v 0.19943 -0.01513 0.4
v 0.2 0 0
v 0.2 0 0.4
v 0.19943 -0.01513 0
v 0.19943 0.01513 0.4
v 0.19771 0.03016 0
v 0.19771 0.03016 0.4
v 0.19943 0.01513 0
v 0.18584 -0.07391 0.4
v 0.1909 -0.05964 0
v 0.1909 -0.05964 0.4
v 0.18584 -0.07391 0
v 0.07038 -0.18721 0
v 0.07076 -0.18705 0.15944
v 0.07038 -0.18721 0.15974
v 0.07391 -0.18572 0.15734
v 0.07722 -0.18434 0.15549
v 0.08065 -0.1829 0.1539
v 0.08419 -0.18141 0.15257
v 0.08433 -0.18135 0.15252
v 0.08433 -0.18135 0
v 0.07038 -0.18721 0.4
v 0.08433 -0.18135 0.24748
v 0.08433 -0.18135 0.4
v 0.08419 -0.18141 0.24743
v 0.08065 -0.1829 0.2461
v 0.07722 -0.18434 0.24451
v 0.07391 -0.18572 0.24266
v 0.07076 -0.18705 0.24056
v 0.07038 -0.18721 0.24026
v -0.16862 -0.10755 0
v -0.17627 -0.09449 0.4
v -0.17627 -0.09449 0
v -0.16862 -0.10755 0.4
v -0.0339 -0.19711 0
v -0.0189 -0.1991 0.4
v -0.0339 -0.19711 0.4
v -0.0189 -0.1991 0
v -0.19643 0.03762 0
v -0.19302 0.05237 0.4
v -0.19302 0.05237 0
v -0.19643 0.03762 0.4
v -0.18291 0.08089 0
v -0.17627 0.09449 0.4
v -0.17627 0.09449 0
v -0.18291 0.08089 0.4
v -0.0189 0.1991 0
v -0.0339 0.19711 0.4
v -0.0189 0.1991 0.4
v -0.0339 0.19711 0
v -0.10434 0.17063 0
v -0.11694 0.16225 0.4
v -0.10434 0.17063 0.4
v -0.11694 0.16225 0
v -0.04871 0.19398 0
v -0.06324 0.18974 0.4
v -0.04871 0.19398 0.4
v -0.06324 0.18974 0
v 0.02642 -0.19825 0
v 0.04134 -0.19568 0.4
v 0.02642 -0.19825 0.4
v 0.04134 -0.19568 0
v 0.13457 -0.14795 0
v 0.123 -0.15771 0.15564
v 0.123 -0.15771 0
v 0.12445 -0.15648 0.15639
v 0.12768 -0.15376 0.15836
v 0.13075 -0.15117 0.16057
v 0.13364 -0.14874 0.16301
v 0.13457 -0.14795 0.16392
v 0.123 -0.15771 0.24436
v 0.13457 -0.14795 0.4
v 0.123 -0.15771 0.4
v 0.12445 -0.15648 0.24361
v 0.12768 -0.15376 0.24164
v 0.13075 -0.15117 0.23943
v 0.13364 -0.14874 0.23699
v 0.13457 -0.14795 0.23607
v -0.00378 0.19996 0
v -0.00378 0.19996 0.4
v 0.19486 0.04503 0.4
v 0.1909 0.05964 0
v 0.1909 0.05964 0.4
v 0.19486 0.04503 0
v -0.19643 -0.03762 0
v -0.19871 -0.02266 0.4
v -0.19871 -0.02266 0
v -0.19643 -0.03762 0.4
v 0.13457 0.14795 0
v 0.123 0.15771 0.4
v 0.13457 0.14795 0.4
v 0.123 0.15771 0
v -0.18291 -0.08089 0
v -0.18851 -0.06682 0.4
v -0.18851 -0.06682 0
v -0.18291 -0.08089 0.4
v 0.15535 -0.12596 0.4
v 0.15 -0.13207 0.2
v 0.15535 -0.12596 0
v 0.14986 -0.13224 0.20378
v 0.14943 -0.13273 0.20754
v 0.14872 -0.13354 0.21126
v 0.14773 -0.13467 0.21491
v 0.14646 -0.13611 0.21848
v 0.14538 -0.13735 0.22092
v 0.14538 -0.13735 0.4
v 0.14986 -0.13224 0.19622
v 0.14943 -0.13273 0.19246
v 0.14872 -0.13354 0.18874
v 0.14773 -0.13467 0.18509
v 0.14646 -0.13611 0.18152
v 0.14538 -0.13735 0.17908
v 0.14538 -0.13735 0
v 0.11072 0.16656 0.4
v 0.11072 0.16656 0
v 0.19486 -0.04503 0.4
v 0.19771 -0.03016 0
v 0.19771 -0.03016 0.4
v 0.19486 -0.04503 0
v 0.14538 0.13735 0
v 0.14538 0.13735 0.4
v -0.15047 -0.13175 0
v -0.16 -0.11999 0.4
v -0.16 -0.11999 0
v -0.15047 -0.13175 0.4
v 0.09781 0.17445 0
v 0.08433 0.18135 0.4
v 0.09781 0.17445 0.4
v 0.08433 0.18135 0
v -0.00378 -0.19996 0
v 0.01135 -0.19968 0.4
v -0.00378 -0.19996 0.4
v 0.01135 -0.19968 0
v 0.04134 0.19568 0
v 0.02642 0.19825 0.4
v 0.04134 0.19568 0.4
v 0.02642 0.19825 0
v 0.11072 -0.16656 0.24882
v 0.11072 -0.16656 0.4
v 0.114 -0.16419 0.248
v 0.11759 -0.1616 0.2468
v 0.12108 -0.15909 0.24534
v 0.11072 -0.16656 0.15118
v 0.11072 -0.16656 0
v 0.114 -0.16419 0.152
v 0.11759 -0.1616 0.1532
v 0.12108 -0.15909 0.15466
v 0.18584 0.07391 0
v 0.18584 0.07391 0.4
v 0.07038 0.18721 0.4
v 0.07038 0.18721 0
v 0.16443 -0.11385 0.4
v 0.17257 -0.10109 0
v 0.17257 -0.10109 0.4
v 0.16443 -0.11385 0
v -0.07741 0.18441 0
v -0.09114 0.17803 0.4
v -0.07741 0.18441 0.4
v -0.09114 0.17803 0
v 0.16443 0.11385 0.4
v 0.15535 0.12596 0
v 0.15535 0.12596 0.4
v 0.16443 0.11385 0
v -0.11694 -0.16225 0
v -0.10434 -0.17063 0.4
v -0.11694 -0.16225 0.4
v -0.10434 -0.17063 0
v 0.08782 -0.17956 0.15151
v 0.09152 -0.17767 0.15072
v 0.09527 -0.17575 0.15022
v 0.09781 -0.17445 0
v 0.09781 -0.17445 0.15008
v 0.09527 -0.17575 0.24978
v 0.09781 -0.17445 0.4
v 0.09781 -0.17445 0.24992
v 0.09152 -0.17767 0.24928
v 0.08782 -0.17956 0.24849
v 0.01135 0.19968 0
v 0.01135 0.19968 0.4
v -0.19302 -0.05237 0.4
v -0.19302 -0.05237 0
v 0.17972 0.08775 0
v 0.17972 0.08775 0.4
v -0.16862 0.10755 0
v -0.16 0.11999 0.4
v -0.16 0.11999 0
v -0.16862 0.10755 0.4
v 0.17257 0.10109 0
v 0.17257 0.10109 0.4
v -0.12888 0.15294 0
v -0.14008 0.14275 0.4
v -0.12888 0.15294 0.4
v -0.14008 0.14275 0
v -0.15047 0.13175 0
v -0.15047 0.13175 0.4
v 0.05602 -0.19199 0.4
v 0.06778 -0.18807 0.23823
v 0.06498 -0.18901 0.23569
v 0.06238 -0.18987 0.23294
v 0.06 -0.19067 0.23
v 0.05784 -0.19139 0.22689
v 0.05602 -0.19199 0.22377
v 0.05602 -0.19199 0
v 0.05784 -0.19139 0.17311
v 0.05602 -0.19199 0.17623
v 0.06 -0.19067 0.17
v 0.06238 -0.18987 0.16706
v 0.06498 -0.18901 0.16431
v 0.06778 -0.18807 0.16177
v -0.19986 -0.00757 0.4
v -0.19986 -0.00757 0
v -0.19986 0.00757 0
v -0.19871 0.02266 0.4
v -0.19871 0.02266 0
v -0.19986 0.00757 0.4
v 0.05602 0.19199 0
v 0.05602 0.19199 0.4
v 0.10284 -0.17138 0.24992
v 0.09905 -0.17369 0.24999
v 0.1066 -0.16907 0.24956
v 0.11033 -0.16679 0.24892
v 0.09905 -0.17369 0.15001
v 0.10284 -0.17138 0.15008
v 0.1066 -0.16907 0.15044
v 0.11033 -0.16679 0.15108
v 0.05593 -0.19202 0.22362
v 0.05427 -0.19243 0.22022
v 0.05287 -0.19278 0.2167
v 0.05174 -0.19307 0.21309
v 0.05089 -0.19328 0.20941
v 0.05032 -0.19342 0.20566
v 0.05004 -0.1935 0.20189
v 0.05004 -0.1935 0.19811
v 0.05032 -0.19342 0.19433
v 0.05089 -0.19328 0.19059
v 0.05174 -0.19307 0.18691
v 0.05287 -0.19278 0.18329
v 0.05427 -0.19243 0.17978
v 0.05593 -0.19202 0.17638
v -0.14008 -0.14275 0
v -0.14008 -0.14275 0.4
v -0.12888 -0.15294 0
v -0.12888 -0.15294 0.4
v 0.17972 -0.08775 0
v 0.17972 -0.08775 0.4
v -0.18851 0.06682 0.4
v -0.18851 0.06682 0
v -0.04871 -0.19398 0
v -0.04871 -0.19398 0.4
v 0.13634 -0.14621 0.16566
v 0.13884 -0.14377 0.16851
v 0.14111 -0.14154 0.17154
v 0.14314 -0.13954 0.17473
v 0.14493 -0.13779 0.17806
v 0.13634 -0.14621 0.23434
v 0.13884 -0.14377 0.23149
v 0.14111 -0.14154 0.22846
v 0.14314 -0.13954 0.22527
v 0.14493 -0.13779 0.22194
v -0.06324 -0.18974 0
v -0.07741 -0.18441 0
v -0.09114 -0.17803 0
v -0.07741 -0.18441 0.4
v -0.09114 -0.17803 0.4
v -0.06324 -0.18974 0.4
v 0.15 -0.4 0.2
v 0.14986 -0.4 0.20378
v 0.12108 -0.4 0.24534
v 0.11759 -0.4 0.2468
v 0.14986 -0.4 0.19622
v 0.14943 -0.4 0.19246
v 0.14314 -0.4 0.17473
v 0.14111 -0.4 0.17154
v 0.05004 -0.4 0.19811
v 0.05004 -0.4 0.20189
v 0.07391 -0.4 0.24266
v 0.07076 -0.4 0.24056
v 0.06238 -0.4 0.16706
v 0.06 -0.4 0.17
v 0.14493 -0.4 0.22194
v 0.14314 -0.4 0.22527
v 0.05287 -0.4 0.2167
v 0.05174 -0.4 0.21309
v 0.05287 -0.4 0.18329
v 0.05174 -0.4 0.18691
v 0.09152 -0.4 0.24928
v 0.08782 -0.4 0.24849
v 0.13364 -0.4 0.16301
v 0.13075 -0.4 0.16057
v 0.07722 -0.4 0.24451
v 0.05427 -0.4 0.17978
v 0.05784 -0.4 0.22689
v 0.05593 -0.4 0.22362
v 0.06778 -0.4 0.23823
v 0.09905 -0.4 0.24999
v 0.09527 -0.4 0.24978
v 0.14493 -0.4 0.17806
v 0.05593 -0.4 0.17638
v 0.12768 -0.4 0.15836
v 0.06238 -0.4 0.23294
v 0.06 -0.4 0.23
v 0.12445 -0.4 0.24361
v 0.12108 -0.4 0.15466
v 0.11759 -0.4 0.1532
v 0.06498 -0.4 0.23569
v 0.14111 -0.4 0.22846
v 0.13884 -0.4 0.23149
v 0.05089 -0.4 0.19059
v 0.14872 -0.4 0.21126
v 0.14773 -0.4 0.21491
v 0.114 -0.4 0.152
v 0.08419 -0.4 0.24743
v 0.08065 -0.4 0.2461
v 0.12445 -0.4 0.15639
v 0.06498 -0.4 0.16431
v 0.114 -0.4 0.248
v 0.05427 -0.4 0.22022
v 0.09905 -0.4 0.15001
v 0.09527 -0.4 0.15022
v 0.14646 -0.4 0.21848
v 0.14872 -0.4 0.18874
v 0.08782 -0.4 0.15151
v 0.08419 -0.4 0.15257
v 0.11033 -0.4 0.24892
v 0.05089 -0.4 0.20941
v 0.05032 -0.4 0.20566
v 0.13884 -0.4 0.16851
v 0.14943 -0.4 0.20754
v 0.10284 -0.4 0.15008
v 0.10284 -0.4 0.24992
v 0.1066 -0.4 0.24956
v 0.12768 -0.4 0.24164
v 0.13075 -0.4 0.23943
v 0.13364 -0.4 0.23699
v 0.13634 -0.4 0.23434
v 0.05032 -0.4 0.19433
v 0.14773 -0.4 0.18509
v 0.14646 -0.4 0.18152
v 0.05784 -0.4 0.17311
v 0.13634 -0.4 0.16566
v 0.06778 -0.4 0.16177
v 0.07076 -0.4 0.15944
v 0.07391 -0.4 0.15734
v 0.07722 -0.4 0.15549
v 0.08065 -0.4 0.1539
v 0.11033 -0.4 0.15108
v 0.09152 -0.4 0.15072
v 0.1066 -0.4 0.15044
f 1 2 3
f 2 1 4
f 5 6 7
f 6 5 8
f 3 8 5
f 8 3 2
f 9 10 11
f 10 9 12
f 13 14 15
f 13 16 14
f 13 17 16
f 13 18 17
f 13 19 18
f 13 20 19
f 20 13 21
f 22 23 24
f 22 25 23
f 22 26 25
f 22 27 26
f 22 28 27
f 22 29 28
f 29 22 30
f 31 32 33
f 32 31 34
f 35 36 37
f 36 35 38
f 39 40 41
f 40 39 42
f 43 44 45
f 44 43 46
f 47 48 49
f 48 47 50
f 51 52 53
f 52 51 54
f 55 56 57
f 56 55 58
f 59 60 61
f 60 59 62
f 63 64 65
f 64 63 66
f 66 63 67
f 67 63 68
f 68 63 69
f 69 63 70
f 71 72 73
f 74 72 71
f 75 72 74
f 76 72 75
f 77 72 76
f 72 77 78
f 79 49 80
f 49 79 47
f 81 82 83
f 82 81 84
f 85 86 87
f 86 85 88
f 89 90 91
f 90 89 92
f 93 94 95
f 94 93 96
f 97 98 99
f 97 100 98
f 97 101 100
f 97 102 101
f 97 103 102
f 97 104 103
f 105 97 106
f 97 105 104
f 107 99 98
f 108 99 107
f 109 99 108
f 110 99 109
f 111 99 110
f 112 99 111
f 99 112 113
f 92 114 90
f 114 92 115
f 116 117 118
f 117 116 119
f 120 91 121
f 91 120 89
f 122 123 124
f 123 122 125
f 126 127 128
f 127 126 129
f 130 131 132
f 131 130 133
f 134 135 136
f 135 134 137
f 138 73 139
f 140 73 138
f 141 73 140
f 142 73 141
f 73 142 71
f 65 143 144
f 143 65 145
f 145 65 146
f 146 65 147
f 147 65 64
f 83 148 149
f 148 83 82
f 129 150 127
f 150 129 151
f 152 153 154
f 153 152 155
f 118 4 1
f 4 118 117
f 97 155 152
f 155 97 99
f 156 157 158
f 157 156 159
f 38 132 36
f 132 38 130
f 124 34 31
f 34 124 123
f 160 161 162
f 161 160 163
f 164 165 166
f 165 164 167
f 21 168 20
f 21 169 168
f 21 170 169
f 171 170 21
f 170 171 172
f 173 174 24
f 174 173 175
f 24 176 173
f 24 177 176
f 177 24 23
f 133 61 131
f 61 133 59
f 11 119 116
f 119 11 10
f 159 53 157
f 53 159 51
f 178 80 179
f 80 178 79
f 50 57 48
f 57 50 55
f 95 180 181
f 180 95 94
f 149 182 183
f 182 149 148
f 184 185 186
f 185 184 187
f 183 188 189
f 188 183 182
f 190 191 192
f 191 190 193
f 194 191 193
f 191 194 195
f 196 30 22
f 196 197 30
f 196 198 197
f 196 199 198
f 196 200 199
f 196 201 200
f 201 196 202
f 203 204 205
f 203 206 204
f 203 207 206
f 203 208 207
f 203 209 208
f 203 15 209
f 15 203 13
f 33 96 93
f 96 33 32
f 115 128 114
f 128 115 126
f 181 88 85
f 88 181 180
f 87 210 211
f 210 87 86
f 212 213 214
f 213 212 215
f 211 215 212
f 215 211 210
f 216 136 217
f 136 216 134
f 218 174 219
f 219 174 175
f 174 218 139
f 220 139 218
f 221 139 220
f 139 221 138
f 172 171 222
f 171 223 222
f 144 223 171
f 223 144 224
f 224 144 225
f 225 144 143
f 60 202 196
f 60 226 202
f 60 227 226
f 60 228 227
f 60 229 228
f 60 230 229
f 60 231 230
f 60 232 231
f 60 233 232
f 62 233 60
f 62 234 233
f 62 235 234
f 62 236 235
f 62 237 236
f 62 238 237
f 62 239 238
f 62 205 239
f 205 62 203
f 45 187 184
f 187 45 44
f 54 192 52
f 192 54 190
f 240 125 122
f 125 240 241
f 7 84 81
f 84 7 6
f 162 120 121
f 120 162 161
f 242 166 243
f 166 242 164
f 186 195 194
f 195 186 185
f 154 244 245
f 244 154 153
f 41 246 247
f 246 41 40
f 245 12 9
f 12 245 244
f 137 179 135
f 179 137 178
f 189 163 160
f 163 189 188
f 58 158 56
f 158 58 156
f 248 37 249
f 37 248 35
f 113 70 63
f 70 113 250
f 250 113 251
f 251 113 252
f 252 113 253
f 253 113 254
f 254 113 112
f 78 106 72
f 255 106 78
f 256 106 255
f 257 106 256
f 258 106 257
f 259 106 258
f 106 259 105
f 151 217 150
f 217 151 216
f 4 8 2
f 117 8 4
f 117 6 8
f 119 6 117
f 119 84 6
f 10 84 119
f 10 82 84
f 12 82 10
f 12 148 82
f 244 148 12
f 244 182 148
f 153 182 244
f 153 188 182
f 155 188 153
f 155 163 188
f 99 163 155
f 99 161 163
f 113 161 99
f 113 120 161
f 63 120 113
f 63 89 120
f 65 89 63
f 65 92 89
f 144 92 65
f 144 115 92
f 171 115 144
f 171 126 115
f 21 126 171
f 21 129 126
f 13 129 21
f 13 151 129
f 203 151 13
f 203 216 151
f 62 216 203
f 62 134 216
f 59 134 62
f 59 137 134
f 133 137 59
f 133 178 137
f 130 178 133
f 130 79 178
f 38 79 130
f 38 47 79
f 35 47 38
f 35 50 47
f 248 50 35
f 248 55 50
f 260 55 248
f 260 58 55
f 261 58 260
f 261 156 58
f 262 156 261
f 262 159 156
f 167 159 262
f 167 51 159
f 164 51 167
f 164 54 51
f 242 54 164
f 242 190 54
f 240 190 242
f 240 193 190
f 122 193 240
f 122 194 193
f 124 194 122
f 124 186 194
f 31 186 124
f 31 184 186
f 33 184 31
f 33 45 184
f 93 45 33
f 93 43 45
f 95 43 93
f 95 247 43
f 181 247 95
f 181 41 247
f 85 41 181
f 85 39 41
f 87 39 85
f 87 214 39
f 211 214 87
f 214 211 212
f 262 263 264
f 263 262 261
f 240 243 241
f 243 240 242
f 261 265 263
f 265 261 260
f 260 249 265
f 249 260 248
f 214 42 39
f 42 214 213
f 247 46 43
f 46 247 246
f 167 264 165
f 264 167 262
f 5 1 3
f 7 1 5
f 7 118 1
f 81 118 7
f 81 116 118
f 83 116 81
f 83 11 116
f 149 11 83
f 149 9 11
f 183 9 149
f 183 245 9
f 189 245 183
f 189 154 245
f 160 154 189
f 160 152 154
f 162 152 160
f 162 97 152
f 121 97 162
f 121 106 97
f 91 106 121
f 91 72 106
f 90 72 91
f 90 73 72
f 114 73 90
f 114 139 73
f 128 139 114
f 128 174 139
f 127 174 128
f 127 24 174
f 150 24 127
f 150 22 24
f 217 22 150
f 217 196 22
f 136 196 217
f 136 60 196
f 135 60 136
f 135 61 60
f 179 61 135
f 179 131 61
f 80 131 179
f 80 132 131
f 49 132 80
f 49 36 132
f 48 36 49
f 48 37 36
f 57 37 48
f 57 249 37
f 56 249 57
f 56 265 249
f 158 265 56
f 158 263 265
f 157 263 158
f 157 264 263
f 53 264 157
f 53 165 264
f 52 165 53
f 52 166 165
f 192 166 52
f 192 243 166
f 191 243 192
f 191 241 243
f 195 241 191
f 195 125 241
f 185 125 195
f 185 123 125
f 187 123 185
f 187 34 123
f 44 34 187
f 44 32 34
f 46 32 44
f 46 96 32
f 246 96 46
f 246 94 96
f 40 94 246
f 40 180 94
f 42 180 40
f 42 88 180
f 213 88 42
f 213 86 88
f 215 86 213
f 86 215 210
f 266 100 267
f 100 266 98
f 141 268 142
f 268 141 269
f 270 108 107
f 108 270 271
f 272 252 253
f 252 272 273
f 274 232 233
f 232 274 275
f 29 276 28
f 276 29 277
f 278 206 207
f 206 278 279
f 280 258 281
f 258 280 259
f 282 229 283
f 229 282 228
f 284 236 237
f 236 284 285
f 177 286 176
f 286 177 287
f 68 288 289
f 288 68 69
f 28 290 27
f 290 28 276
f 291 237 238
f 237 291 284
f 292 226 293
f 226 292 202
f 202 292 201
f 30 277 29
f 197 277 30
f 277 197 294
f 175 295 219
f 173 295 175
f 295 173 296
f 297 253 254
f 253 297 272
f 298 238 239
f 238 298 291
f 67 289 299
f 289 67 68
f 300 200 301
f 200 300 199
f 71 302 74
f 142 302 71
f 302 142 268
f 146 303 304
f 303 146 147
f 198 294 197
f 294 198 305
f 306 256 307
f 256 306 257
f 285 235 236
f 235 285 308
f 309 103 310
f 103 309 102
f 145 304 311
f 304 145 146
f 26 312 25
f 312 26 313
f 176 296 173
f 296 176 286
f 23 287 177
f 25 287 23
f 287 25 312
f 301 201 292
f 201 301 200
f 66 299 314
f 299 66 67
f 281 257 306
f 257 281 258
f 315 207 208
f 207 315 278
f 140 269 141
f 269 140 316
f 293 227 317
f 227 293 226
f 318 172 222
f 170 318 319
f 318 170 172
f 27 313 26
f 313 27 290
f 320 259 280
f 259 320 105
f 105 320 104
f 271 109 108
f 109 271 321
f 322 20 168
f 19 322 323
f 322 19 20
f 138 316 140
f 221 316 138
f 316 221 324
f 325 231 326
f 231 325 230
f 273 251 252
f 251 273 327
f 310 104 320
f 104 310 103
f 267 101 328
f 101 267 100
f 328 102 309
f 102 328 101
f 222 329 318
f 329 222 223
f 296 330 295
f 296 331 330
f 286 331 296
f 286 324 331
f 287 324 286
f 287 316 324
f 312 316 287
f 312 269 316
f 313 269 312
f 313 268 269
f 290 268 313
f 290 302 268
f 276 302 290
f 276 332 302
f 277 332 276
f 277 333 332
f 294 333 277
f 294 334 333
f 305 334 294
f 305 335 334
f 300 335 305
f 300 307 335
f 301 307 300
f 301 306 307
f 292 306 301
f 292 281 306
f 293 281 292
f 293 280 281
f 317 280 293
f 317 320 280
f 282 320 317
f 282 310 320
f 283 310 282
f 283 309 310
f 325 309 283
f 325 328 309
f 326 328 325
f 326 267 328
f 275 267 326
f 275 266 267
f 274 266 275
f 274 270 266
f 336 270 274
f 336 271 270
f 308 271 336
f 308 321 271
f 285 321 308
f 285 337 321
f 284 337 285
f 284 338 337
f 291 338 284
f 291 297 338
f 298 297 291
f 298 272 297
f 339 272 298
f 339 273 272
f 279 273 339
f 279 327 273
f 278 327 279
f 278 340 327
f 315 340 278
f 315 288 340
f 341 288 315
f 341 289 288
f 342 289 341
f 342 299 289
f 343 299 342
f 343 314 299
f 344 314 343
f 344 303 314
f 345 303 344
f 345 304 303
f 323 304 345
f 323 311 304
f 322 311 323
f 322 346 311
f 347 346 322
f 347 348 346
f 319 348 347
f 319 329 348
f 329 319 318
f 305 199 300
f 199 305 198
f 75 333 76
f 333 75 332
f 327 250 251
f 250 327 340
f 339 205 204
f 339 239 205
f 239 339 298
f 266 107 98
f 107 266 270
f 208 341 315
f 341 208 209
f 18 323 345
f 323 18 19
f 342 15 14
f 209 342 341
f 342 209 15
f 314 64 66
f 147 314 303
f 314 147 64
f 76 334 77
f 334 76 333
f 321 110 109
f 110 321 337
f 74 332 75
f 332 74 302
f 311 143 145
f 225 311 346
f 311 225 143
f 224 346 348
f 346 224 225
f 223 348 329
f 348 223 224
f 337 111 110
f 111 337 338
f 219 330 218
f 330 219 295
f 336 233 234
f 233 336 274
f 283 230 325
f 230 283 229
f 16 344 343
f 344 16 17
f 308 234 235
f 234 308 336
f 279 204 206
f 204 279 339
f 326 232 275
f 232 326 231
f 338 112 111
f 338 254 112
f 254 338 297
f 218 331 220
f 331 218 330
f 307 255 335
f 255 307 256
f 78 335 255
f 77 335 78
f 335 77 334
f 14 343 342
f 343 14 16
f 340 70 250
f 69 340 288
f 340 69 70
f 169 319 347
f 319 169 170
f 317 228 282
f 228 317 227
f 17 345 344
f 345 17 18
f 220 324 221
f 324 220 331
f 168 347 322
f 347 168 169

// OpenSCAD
$fn = 83;

union()
{

cylinder(h=0.4, r1=0.2, r2=0.2,center=false);


translate([0.1, 0.0, 0.2])
{
    rotate([90, 0, 0])
    {
    cylinder(h=0.4, r1=0.05, r2=0.05,center=false);
    }
}
}
